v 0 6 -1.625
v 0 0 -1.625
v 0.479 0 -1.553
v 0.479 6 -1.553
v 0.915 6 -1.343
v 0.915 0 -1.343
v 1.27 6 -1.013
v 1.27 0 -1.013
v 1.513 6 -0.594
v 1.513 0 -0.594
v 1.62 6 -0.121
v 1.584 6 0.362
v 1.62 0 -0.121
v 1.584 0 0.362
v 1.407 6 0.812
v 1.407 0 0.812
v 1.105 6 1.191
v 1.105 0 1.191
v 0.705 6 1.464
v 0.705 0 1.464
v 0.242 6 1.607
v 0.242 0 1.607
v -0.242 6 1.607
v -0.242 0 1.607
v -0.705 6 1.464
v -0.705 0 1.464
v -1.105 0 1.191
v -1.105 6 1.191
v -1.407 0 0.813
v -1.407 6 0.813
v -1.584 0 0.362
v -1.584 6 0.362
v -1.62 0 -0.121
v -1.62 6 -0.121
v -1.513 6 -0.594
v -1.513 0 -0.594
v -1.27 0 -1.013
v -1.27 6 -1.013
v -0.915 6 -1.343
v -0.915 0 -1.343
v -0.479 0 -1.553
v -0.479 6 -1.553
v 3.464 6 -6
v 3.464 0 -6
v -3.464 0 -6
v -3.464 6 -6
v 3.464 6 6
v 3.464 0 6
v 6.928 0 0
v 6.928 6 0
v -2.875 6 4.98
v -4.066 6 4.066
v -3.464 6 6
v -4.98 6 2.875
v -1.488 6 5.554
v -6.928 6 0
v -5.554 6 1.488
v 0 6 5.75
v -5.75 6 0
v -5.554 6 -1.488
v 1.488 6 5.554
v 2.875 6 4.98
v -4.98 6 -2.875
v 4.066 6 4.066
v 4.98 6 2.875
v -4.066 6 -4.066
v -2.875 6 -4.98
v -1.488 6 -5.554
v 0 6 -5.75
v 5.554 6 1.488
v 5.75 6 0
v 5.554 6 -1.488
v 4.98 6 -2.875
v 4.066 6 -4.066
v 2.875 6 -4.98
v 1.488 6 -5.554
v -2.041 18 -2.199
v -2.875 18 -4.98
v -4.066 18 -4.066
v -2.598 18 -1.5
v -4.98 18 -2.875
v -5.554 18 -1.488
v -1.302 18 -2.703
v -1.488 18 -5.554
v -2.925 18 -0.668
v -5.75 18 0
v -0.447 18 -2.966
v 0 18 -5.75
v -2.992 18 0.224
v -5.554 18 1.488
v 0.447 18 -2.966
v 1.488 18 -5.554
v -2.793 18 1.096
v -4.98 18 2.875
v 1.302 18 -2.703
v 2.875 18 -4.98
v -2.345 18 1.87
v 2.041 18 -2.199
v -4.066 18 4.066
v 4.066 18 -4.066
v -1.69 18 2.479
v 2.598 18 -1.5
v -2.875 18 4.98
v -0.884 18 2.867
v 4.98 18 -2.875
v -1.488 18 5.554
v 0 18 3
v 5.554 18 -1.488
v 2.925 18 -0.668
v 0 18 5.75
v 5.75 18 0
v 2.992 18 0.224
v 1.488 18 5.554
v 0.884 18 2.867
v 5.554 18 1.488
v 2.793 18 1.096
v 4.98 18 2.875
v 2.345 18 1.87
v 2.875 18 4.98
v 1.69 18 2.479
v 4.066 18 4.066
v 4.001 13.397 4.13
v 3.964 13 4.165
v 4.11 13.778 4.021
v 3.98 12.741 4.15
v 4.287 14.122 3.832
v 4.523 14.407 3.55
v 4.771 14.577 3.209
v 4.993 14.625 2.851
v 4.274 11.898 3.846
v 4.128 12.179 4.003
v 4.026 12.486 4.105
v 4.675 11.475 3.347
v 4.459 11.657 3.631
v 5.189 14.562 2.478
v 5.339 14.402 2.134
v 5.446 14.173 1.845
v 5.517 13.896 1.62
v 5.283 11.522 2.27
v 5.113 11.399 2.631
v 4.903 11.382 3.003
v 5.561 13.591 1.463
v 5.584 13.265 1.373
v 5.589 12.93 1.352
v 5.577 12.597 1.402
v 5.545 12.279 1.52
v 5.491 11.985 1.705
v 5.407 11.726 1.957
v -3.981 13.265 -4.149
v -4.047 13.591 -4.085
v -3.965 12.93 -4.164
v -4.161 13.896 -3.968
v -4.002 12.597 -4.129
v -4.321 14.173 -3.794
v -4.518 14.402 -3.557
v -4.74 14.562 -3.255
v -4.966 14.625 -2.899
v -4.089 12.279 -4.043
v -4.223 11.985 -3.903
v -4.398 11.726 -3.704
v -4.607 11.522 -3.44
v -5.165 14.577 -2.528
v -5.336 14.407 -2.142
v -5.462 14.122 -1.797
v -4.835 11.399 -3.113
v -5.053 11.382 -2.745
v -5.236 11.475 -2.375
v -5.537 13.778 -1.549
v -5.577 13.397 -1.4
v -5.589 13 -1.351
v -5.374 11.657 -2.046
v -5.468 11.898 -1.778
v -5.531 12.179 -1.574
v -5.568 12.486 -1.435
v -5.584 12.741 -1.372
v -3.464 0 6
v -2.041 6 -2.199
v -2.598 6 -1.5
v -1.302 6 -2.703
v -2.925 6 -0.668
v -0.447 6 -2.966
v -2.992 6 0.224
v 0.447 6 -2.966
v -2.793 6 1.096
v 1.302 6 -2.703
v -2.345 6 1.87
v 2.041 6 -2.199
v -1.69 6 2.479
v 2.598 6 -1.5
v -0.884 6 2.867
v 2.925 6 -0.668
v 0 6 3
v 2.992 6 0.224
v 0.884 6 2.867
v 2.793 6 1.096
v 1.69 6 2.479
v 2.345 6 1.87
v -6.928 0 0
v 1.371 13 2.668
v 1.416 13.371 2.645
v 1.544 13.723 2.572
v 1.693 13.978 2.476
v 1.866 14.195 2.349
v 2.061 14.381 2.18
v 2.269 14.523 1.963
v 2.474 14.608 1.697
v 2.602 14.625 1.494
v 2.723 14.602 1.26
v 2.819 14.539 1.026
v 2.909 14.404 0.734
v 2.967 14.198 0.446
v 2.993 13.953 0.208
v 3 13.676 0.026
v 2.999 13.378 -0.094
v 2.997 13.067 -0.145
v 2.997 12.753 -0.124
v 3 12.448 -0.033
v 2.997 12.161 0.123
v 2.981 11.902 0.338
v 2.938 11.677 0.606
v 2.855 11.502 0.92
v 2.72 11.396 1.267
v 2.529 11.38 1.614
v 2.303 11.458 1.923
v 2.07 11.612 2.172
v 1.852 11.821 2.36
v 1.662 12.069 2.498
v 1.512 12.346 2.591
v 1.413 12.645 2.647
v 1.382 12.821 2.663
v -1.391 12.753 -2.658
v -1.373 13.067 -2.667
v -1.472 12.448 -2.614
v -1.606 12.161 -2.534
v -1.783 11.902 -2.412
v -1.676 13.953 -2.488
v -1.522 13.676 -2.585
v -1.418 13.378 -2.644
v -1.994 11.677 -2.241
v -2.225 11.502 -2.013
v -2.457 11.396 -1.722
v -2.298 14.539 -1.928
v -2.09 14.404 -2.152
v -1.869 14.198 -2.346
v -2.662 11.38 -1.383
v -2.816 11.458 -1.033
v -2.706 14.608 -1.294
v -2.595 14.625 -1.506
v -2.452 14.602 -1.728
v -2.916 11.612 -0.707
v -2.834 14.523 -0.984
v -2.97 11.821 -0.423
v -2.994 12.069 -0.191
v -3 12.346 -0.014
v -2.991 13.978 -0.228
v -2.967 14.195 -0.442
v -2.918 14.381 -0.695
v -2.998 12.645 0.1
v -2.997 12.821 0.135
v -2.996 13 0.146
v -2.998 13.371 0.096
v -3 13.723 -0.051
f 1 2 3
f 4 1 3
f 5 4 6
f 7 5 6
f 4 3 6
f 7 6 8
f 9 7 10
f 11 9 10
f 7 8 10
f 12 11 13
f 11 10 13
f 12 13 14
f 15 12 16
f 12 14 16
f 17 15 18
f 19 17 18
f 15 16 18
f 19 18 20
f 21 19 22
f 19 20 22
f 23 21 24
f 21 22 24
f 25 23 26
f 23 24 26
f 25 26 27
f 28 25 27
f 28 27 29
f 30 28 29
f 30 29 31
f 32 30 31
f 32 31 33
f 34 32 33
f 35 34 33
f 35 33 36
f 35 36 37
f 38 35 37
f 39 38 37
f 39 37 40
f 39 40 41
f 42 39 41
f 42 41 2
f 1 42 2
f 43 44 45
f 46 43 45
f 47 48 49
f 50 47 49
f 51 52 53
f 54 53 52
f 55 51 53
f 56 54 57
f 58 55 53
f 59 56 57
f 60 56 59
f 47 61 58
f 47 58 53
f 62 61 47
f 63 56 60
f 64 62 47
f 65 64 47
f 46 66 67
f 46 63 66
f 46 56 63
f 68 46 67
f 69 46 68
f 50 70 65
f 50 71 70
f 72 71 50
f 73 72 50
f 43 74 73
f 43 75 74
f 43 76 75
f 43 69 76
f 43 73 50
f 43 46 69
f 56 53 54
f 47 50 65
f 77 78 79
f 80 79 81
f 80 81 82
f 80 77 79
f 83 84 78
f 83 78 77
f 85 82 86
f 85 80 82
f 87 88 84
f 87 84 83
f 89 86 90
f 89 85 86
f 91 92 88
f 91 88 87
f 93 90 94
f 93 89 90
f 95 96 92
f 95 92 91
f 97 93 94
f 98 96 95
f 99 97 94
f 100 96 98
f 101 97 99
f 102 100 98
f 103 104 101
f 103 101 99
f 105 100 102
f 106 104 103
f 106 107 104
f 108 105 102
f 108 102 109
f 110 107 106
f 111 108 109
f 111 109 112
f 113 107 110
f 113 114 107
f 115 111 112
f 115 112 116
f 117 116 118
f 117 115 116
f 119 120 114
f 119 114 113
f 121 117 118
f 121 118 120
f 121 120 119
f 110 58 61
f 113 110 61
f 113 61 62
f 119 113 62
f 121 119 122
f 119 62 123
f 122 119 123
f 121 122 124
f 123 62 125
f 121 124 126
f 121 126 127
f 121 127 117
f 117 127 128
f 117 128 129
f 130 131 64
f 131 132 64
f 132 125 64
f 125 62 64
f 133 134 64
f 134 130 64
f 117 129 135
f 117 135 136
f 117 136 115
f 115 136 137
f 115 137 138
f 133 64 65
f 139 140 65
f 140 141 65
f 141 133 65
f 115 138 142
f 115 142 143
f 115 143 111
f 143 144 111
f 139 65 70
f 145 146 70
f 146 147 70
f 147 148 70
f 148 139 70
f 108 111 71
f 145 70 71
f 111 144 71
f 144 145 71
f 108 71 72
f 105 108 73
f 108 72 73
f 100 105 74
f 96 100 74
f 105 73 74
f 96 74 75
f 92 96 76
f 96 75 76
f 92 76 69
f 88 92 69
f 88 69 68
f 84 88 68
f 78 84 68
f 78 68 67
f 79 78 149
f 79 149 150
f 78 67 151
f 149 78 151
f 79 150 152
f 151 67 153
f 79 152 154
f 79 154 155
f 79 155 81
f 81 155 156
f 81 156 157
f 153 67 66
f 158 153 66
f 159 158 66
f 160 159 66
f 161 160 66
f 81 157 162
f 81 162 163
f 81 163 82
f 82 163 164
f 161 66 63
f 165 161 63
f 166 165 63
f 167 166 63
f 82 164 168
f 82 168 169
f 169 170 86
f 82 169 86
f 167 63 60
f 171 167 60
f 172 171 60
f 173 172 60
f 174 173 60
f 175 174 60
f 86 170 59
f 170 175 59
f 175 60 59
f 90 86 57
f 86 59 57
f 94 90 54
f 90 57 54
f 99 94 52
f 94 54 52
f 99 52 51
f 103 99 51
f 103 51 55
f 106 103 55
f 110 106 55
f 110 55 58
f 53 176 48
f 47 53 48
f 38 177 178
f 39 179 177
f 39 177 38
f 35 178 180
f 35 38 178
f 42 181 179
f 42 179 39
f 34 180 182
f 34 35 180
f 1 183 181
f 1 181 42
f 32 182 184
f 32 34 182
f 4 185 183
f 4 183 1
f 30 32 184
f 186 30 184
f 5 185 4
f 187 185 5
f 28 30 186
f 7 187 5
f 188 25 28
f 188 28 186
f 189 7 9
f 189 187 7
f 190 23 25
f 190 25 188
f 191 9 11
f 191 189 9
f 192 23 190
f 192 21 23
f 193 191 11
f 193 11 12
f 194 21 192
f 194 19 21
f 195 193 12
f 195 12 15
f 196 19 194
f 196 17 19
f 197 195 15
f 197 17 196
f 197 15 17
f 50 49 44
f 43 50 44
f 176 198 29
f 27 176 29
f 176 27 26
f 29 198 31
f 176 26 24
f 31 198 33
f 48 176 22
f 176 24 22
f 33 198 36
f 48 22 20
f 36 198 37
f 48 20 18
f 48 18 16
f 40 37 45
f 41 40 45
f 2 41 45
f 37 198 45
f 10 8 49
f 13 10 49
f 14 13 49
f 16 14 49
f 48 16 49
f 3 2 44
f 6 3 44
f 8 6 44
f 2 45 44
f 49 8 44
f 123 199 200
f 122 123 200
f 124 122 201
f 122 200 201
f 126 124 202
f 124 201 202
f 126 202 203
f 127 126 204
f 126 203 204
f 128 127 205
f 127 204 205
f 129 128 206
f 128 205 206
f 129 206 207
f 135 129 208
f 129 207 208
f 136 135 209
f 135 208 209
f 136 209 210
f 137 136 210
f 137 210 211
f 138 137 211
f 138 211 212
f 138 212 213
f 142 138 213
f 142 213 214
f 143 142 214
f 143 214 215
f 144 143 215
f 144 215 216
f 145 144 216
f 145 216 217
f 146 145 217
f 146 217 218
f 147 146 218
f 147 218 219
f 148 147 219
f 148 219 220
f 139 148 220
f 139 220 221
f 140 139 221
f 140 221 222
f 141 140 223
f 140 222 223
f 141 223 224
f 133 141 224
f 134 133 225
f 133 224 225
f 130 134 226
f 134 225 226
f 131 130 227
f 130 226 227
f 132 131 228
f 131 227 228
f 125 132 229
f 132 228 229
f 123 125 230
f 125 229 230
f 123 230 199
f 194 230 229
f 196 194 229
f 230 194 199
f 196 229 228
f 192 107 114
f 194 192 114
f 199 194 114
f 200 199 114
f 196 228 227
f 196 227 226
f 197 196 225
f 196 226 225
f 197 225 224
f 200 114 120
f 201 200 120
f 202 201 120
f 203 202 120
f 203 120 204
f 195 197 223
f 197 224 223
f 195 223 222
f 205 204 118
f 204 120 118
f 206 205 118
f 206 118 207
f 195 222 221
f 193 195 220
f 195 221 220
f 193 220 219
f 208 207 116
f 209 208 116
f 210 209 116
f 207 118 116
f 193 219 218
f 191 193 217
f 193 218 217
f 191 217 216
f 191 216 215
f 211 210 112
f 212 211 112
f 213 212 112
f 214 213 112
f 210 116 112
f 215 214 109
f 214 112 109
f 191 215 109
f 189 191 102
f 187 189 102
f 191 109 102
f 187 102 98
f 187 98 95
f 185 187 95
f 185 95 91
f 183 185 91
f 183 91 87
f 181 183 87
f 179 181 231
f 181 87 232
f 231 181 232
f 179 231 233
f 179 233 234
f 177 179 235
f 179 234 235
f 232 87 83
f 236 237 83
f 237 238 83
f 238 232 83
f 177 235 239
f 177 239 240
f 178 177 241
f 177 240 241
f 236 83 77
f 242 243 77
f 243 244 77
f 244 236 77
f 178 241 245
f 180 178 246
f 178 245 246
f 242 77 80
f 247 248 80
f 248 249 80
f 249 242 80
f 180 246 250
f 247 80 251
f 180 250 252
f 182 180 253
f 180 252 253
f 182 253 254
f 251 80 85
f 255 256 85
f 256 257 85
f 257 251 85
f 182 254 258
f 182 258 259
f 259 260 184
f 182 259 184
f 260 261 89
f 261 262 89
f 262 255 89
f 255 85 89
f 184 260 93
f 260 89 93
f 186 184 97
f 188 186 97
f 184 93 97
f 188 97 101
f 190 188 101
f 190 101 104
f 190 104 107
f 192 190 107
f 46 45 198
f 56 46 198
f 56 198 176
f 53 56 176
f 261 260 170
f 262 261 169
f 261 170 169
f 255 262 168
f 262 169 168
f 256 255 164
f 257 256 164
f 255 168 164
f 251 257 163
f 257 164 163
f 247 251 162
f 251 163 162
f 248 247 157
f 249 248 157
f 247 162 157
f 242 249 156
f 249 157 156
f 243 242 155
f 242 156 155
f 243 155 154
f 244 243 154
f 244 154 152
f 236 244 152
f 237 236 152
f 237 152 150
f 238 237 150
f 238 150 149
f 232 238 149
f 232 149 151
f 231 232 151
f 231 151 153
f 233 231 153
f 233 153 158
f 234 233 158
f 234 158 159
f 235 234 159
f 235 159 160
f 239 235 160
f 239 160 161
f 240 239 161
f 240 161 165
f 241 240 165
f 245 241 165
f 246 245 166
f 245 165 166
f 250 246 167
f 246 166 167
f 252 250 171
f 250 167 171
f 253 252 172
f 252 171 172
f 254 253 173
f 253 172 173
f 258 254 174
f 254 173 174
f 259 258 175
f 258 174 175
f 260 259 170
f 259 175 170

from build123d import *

# Parameters (mm, degrees)
EXTRUDE_1_DEPTH     = 6
SKETCH_2_R          = 5.75
EXTRUDE_2_DEPTH     = 12
SKETCH_3_R          = 1.625
CUT_EXTRUDE_1_DEPTH = 300
SKETCH_4_R          = 3
CUT_EXTRUDE_2_DEPTH = 12
SKETCH_5_R          = 1.625
CUT_EXTRUDE_3_DEPTH = 12


with BuildPart() as part:
    # Эскиз1 → Бобышка-Вытянуть1 (new body)
    with BuildSketch(Plane(origin=(0, 0, 0), x_dir=(1, 0, 0), z_dir=(0, 1, 0))):
        Polygon((6.92820323, 0), (3.464101615, 6), (-3.464101615, 6), (-6.92820323, 0), (-3.464101615, -6), (3.464101615, -6), align=None)
    extrude(amount=EXTRUDE_1_DEPTH)

    # Эскиз2 → Бобышка-Вытянуть2 (add)
    with BuildSketch(Plane(origin=(0, 6, 0), x_dir=(1, 0, 0), z_dir=(0, 1, 0))):
        with Locations(Location((0, 0, 0), (0, 0, 270))):
            Circle(SKETCH_2_R)
    extrude(amount=EXTRUDE_2_DEPTH)

    # Эскиз3 → Вырез-Вытянуть1 (cut)
    with BuildSketch(Plane.XZ):
        with Locations(Location((0, 0, 0), (0, 0, 270))):
            Circle(SKETCH_3_R)
    extrude(amount=-CUT_EXTRUDE_1_DEPTH, mode=Mode.SUBTRACT)

    # Эскиз4 → Вырез-Вытянуть2 (cut)
    with BuildSketch(Plane(origin=(0, 18, 0), x_dir=(1, 0, 0), z_dir=(0, 1, 0))):
        with Locations(Location((0, 0, 0), (0, 0, 270))):
            Circle(SKETCH_4_R)
    extrude(amount=-CUT_EXTRUDE_2_DEPTH, mode=Mode.SUBTRACT)

    # Эскиз5 → Вырез-Вытянуть3 (cut)
    with BuildSketch(Plane(origin=(-5.196152423, 0, -3), x_dir=(-0.5000000000000003, 0, 0.8660254037844386), z_dir=(-0.8660254037844385, 0, -0.5000000000000002))):
        with Locations((0, 13)):
            Circle(SKETCH_5_R)
    extrude(amount=-CUT_EXTRUDE_3_DEPTH, mode=Mode.SUBTRACT)


solid = part.part
